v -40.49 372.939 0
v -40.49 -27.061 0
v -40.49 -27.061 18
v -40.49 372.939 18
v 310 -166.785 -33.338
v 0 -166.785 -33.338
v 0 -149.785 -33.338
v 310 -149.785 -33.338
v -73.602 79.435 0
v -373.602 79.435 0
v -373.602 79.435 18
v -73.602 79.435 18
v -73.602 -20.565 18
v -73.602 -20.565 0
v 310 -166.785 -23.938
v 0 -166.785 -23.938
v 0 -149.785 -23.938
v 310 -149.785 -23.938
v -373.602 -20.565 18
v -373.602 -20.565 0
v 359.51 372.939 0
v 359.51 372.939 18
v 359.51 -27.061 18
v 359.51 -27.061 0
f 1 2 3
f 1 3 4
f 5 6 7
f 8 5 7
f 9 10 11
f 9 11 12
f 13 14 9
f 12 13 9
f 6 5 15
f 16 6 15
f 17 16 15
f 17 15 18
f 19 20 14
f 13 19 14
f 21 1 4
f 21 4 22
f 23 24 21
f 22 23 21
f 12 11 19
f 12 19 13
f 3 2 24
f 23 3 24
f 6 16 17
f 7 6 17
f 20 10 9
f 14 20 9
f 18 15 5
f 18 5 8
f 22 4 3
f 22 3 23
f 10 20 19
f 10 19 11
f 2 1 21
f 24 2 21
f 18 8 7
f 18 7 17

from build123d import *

# Parameters (mm, degrees)
F0_W     = 400
F0_H     = 400
F1_DEPTH = 18
F2_W     = 17
F2_H     = 9.4
F3_DEPTH = 310
F4_W     = 300
F4_H     = 100
F5_DEPTH = 18


with BuildPart() as f1:
    # F0 (on Top) → F1 (new body)
    with BuildSketch(Plane.XY):
        with Locations((159.509701, 172.939374)):
            Rectangle(F0_W, F0_H)
    extrude(amount=F1_DEPTH)


with BuildPart() as f3:
    # F2 (on Right) → F3 (new body)
    with BuildSketch(Plane.YZ):
        with Locations((-158.285493, -28.638394)):
            Rectangle(F2_W, F2_H)
    extrude(amount=F3_DEPTH)


with BuildPart() as f5:
    # F4 (on Top) → F5 (new body)
    with BuildSketch(Plane.XY):
        with Locations((-223.601973, 29.434749)):
            Rectangle(F4_W, F4_H)
    extrude(amount=F5_DEPTH)


solid = Compound([f1.part, f3.part, f5.part])
